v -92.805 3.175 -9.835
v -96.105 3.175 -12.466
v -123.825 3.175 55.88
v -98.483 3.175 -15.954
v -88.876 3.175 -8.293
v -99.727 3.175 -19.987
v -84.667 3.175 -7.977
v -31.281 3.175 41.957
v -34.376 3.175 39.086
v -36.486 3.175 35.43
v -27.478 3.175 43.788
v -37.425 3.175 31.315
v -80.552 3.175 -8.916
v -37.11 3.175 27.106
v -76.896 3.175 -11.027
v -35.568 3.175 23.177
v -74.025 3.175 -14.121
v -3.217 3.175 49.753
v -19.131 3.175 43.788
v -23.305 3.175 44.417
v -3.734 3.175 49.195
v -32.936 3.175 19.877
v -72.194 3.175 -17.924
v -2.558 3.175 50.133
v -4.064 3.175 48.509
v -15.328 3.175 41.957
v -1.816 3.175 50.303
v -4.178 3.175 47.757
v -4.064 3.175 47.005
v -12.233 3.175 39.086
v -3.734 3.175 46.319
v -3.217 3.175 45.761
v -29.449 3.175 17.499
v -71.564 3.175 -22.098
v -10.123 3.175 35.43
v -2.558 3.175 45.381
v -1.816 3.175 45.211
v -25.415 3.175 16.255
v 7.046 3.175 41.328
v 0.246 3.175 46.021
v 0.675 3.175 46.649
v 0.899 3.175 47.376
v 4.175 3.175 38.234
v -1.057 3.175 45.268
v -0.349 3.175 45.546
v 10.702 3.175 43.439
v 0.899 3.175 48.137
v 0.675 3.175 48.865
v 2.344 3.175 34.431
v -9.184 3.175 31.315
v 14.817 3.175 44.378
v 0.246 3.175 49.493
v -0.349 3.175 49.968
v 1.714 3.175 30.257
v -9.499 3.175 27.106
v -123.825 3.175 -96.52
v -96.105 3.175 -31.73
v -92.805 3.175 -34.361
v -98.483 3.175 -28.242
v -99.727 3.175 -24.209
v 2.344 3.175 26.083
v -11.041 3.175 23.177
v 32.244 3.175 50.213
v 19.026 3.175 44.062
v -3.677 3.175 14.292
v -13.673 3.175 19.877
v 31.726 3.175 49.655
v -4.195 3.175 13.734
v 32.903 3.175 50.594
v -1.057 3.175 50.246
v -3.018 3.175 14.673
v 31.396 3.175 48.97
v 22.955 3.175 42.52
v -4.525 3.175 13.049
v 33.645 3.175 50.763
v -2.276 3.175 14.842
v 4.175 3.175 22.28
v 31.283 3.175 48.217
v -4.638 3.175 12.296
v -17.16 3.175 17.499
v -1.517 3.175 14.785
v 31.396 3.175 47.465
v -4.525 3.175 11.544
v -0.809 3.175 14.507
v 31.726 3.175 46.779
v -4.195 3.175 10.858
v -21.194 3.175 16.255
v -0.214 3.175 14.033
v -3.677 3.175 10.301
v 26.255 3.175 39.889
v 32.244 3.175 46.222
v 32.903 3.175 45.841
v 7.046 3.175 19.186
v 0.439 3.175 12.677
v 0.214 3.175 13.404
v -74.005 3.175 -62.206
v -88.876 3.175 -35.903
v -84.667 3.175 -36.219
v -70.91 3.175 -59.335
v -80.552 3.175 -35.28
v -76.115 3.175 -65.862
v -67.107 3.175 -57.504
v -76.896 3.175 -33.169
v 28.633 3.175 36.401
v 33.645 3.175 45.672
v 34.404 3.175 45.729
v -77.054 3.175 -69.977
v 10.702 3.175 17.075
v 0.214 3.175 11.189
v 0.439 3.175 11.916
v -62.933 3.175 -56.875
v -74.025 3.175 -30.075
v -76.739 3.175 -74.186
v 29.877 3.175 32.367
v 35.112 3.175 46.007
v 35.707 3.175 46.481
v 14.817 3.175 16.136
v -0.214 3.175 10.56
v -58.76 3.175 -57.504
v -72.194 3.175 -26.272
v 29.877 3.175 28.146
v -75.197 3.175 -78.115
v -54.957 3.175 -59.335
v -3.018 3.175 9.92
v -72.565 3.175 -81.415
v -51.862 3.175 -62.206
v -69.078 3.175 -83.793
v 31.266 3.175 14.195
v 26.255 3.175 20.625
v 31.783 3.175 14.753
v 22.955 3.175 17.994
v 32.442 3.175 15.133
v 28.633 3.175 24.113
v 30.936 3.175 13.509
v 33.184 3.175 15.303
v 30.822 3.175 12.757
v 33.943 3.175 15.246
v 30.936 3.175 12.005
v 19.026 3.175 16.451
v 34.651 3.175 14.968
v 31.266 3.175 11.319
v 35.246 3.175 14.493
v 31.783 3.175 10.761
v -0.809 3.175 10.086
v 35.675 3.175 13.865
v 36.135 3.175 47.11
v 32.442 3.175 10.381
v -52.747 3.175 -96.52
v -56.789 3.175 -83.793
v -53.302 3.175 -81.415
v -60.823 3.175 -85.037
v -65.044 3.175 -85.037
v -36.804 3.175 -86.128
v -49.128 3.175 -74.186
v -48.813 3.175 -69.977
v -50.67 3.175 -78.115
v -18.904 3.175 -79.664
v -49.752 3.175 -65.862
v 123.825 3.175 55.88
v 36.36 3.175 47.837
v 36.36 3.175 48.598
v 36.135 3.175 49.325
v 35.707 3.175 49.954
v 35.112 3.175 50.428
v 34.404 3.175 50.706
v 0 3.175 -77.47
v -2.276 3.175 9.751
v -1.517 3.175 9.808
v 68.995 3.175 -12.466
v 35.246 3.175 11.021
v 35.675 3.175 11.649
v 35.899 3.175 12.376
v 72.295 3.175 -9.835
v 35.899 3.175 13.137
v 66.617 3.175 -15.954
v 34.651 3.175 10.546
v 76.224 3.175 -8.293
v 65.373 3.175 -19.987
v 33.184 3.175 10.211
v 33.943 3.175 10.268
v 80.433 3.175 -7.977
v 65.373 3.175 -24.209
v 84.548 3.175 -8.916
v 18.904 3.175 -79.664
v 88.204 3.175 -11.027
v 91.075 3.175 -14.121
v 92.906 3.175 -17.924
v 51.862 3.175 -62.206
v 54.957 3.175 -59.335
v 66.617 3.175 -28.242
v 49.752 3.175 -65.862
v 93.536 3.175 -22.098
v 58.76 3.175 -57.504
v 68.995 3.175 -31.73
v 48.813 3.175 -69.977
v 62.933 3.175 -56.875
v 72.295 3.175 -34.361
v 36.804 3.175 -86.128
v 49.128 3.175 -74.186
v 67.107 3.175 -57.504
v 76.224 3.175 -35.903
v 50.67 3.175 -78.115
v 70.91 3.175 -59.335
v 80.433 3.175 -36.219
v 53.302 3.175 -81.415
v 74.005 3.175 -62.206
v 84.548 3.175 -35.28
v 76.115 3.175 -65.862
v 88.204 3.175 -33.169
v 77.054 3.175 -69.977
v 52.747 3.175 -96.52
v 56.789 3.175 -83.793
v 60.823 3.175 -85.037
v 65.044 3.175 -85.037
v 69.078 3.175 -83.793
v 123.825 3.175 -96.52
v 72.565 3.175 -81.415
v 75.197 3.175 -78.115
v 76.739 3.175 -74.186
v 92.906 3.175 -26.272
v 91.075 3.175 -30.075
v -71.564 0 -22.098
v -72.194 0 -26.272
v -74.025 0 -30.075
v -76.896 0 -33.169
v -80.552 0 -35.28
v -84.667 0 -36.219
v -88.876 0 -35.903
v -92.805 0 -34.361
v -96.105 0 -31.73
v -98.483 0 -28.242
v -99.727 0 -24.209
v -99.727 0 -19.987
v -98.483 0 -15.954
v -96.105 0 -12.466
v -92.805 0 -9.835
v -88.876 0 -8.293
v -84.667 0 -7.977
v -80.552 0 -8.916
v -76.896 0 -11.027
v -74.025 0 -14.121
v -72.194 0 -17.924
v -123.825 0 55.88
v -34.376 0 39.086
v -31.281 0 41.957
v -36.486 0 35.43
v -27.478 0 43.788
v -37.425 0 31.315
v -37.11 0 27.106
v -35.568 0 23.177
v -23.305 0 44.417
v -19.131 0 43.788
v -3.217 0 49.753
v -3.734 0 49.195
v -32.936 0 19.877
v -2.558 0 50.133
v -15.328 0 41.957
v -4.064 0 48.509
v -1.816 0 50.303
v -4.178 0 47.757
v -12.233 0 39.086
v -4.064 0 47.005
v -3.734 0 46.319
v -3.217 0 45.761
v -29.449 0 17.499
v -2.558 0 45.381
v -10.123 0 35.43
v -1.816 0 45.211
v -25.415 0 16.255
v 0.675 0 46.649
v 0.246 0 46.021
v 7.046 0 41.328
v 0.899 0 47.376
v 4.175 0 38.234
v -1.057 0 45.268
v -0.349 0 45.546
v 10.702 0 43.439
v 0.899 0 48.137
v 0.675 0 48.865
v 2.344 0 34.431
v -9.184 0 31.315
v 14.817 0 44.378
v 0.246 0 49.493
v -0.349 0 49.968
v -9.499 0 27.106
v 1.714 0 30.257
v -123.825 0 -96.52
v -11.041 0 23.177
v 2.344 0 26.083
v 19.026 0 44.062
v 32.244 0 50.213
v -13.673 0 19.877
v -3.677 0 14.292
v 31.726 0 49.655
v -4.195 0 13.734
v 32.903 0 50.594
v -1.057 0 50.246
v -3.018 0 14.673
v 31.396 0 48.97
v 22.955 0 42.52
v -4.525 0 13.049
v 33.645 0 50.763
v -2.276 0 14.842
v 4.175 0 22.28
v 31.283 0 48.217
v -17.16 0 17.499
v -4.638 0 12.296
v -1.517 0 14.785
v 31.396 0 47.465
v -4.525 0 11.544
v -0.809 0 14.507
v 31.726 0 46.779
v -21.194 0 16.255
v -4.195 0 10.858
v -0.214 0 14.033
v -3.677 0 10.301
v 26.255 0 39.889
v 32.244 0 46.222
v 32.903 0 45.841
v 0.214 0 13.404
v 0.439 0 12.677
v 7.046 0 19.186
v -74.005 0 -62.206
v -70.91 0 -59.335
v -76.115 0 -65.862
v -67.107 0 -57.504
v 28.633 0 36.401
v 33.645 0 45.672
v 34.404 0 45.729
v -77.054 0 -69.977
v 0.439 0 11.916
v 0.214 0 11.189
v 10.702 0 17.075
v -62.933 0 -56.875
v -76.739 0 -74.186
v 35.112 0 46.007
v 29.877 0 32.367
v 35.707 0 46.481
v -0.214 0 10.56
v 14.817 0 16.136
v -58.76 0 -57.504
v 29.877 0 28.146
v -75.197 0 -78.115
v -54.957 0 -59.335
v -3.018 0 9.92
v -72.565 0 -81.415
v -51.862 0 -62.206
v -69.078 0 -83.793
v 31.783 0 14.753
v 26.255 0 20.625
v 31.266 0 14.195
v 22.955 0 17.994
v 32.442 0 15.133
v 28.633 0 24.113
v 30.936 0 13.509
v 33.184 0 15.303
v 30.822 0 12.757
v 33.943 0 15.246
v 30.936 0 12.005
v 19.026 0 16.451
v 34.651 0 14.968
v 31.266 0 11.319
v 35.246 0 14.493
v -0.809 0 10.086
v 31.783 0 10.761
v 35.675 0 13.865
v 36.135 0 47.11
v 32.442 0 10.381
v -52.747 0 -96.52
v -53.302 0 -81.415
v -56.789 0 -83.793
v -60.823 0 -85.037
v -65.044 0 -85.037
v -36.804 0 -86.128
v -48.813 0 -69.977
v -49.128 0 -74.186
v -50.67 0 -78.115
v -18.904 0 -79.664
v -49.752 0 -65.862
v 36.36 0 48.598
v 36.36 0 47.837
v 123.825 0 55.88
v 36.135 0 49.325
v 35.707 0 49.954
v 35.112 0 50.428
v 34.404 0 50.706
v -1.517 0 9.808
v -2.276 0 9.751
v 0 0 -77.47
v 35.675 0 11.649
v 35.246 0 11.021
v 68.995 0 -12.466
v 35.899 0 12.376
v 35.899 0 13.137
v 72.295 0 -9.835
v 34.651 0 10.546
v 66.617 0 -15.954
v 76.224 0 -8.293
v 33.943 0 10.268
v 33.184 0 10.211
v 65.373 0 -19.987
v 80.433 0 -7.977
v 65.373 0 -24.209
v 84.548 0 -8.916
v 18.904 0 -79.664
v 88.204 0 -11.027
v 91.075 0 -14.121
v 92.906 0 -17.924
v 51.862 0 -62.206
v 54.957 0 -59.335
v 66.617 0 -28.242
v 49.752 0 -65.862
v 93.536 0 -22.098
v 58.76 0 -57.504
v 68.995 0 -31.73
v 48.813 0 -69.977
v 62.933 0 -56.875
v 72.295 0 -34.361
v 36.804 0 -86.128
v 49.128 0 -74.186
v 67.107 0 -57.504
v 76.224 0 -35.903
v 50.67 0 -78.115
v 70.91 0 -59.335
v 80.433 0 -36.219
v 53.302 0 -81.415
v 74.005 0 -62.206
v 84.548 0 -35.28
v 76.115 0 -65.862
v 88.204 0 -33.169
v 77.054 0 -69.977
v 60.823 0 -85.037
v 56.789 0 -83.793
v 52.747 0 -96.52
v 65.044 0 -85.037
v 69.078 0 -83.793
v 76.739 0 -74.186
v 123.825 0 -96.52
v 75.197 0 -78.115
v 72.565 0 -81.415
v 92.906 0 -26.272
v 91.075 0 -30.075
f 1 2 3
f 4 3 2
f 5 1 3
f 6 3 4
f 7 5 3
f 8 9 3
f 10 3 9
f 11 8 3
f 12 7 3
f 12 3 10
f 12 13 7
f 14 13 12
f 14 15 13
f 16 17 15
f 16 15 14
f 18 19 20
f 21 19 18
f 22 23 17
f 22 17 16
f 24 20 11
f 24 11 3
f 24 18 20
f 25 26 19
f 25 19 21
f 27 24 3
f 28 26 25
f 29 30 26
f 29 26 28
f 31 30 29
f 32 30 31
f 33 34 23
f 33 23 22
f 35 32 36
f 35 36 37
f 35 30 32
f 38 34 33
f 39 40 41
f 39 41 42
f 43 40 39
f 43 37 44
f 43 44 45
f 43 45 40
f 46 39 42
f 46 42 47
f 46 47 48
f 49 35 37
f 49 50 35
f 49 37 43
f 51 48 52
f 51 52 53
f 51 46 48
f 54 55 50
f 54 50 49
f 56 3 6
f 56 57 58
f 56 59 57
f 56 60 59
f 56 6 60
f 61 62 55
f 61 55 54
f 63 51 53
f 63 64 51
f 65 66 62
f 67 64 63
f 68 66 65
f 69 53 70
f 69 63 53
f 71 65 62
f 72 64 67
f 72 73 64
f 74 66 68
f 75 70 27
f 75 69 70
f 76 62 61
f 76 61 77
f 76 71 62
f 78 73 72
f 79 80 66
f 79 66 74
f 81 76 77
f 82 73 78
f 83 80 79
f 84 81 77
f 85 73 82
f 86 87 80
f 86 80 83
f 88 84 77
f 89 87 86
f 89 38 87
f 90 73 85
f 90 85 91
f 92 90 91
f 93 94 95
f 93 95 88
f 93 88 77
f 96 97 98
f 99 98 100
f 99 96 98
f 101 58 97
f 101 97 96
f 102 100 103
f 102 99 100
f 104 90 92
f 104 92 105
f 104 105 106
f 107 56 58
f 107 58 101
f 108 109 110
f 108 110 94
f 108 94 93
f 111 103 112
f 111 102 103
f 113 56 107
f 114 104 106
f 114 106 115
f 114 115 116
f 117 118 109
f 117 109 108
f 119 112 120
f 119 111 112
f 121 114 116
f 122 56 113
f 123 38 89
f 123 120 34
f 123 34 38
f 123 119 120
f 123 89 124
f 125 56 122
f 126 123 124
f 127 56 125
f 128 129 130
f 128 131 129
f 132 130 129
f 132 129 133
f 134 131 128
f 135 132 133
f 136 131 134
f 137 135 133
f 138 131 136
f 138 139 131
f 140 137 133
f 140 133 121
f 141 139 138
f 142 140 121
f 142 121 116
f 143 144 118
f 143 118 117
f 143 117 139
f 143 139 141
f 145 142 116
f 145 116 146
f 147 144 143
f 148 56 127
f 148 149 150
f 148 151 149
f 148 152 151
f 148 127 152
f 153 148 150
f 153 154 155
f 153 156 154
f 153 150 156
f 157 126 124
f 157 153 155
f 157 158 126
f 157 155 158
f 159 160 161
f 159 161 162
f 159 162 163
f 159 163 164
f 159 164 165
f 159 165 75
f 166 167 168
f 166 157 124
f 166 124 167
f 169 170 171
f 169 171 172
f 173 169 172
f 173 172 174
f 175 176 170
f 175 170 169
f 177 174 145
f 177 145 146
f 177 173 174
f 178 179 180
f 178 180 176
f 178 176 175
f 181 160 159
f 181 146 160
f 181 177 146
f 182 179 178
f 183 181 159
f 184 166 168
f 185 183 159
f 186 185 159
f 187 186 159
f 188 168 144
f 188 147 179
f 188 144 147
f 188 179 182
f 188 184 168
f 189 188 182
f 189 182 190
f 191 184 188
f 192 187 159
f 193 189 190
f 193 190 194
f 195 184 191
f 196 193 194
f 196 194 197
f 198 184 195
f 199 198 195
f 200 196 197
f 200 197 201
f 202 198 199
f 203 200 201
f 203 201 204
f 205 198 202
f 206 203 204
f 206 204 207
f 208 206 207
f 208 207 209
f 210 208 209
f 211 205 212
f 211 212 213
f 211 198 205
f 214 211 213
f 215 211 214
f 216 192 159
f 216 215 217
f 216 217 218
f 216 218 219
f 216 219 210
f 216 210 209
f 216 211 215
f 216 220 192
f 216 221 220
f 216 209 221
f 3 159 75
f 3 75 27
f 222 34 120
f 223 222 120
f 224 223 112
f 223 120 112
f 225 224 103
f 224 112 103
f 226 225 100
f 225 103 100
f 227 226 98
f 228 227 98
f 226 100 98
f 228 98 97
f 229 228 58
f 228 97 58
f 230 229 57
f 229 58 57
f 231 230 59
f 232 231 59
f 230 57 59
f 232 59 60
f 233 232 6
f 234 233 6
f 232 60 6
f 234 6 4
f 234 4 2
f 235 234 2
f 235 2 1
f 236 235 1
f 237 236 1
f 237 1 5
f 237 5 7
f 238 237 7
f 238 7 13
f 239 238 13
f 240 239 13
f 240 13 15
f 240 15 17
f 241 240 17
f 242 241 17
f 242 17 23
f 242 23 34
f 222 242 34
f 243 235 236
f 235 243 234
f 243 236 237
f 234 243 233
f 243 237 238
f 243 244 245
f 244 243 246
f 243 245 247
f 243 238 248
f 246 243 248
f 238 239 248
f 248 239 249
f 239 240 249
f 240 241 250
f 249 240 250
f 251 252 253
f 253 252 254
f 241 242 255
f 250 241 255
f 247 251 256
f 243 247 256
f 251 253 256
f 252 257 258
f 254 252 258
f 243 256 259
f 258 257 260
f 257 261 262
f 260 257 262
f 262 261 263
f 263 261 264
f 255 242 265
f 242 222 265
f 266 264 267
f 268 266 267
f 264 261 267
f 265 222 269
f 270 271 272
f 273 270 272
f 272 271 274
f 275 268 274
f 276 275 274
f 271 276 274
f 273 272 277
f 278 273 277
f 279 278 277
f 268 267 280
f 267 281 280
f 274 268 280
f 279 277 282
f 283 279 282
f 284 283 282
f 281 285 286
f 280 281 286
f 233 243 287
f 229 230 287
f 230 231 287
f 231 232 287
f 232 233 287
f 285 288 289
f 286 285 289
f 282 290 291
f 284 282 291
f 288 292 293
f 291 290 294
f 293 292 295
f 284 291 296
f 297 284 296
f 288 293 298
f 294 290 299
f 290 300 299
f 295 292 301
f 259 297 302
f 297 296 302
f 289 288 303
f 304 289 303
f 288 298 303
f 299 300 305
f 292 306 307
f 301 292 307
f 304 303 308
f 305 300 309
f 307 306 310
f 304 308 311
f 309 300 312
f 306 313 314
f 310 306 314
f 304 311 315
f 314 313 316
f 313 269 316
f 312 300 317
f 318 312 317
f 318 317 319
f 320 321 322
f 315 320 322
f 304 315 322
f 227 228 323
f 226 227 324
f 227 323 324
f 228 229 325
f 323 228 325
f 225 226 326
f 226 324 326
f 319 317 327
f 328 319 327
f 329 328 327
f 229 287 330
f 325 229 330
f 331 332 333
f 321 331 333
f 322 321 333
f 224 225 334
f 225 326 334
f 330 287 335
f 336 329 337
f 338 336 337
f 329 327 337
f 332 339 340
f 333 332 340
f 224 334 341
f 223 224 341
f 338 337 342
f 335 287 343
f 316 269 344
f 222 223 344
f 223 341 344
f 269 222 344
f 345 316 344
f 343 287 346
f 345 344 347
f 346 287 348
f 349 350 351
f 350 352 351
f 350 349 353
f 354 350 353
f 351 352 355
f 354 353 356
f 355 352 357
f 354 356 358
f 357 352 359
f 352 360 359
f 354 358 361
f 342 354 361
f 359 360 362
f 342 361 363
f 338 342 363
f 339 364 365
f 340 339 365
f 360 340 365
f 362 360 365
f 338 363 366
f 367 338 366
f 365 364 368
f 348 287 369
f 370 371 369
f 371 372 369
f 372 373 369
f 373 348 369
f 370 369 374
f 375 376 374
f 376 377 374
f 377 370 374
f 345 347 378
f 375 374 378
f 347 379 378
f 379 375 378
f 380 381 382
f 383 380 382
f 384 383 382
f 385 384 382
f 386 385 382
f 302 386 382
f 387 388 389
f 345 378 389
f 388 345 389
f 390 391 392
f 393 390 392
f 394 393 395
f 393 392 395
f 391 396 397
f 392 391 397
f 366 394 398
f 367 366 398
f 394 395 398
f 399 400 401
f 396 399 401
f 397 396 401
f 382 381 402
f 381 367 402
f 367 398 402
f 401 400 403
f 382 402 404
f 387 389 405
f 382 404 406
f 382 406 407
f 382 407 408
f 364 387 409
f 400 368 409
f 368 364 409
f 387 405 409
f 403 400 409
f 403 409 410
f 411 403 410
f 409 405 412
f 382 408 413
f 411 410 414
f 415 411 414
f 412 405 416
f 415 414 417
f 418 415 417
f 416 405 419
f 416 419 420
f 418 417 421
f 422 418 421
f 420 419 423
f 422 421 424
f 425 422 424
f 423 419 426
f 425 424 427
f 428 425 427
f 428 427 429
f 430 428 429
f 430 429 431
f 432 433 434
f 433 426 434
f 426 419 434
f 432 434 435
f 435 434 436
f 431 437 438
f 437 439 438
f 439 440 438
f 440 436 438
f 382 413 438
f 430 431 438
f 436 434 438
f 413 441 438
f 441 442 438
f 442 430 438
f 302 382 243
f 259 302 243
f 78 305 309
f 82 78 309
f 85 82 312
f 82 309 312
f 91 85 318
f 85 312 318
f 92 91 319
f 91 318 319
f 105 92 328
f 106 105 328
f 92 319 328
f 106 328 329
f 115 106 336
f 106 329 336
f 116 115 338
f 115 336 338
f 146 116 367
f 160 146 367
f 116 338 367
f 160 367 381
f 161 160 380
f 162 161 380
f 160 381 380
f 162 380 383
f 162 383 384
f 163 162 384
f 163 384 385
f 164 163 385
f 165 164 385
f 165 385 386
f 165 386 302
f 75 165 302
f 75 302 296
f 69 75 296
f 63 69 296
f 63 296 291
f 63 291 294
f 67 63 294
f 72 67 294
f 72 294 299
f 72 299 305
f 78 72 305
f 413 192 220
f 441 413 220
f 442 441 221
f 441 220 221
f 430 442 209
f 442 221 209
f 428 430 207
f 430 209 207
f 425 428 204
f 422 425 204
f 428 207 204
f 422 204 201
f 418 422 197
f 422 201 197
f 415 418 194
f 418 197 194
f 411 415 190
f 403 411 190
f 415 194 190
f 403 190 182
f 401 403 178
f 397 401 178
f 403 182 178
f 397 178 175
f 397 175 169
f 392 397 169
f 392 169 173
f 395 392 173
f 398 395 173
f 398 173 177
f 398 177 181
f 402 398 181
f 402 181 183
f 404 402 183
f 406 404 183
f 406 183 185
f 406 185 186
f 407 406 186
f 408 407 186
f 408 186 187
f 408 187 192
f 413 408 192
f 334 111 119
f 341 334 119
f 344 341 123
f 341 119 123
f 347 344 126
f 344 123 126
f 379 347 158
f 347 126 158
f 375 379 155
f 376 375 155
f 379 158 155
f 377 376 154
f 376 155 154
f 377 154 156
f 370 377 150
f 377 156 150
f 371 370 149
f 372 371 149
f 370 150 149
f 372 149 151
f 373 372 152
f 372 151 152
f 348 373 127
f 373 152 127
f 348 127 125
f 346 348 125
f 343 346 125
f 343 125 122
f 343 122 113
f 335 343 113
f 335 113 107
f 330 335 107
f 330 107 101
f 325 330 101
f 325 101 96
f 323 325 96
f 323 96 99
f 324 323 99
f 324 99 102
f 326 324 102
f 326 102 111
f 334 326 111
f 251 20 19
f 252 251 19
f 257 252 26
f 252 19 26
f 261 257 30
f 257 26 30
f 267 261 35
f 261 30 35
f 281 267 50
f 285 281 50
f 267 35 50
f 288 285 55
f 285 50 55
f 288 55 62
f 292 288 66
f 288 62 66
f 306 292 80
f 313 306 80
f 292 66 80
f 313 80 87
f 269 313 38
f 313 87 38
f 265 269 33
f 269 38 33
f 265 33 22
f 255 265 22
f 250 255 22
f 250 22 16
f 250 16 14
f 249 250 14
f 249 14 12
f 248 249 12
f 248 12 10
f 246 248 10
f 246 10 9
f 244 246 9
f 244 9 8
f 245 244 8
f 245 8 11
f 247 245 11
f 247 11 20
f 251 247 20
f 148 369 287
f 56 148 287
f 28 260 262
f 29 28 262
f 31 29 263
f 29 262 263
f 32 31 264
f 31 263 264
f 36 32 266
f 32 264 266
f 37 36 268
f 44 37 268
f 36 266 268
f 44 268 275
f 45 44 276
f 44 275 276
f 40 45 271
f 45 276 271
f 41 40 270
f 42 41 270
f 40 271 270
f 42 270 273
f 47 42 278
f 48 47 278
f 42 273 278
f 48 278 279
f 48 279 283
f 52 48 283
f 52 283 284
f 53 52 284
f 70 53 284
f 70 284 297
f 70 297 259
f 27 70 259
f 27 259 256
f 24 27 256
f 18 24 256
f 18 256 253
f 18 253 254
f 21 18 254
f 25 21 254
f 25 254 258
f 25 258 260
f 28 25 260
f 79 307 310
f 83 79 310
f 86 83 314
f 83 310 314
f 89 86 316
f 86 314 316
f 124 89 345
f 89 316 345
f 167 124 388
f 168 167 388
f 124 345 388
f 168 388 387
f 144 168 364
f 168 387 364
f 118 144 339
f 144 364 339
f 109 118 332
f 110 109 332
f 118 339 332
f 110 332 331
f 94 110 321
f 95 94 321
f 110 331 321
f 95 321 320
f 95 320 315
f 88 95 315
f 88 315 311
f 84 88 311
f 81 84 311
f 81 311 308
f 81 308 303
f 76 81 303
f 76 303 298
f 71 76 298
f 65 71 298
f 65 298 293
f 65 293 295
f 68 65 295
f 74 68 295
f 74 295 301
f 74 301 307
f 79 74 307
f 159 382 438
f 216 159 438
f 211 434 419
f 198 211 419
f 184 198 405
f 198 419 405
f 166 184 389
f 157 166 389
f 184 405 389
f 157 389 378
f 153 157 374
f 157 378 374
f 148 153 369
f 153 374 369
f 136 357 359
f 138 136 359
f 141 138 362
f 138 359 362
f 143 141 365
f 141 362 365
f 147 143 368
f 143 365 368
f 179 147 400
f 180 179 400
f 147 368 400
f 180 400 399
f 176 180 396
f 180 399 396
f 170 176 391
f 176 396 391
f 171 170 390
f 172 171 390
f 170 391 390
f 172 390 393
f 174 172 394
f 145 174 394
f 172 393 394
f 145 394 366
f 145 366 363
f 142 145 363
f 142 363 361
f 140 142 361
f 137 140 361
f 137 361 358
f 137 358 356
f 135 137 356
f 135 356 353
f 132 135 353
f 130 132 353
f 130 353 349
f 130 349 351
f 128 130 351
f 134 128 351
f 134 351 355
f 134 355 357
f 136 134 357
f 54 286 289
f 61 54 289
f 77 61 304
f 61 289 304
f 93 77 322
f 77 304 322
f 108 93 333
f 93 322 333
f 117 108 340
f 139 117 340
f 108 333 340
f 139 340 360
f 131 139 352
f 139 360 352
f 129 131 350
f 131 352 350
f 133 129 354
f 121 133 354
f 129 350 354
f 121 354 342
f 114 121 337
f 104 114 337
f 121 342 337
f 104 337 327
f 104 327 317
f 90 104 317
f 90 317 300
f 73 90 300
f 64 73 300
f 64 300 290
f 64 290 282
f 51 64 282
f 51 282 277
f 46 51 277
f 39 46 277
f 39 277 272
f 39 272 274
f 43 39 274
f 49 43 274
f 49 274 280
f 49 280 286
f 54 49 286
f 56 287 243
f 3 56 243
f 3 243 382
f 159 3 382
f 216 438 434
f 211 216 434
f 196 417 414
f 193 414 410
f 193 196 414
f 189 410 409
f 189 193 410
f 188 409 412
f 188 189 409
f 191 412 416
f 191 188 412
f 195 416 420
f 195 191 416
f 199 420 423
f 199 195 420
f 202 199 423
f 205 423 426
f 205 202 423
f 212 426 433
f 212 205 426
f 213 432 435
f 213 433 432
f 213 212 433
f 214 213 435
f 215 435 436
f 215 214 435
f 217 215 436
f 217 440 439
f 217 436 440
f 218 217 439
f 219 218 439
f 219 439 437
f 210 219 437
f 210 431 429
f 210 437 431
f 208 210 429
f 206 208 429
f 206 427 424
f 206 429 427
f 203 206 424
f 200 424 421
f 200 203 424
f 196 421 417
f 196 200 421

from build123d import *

# Parameters (mm, degrees)
BOSS_EXTRUDE1_DEPTH     = 3.175
F_1_1_115_DOWEL_HOLE1_D = 28.321
F_10_CLEARANCE_HOLE1_D  = 5.1054
F_1_1_115_DOWEL_HOLE3_D = 28.321
SKETCH11_R              = 14.1605
CUT_EXTRUDE1_DEPTH      = 158.031276025
SKETCH12_R              = 14.1605
CUT_EXTRUDE2_DEPTH      = 158.031276025


with BuildPart() as part:
    # Sketch1 → Boss-Extrude1 (new body)
    with BuildSketch(Plane(origin=(0, 0, 0), x_dir=(1, 0, 0), z_dir=(0, 1, 0))):
        with BuildLine():
            Line((-123.825, -55.88), (123.825, -55.88))
            Line((123.825, -55.88), (123.825, 96.52))
            Line((123.825, 96.52), (52.74706153, 96.52))
            ThreePointArc((52.74706153, 96.52), (0, 77.47), (-52.74706153, 96.52))
            Line((-52.74706153, 96.52), (-123.825, 96.52))
            Line((-123.825, 96.52), (-123.825, -55.88))
        make_face()
    extrude(amount=BOSS_EXTRUDE1_DEPTH)

    # 1 (1.115) Dowel Hole1 (through all)
    with Locations(Plane(origin=(0, 3.175, 0), x_dir=(1, 0, 0), z_dir=(0, 1, 0))):
        with Locations((15.875, -30.256942448)):
            Hole(F_1_1_115_DOWEL_HOLE1_D / 2)

    # #10 Clearance Hole1 (through all)
    with Locations(Plane(origin=(0, 3.175, 0), x_dir=(1, 0, 0), z_dir=(0, 1, 0))):
        with Locations((-1.625, -47.756942448), (33.375, -12.756942448), (-2.085512242, -12.296430205), (33.835512242, -48.21745469)):
            Hole(F_10_CLEARANCE_HOLE1_D / 2)

    # 1 (1.115) Dowel Hole3 (through all)
    with Locations(Plane(origin=(-3.175, -34.925, 0), x_dir=(-1, 0, 0), z_dir=(0, -1, 0))):
        with Locations((82.55, 22.098), (-82.55, 22.098)):
            Hole(F_1_1_115_DOWEL_HOLE3_D / 2)

    # Sketch11 → Cut-Extrude1 (cut, through all)
    with BuildSketch(Plane(origin=(0, 3.175, 0), x_dir=(1, 0, 0), z_dir=(0, 1, 0))):
        with Locations(Location((-23.3045, -30.256942448, 0), (0, 0, 270))):
            Circle(SKETCH11_R)
    extrude(amount=-CUT_EXTRUDE1_DEPTH, mode=Mode.SUBTRACT)

    # Sketch12 → Cut-Extrude2 (cut, through all)
    with BuildSketch(Plane(origin=(0, 3.175, 0), x_dir=(1, 0, 0), z_dir=(0, 1, 0))):
        with Locations(Location((-62.933495539, 71.035024331, 0), (0, 0, 270))):
            Circle(SKETCH12_R)
    cut_extrude2 = extrude(amount=-CUT_EXTRUDE2_DEPTH, mode=Mode.SUBTRACT)

    # Mirror2: Cut-Extrude2 across plane
    add(cut_extrude2.mirror(Plane(origin=(0, 0, 0), x_dir=(0, 0, 1), z_dir=(1, 0, 0))), mode=Mode.SUBTRACT)


solid = part.part
